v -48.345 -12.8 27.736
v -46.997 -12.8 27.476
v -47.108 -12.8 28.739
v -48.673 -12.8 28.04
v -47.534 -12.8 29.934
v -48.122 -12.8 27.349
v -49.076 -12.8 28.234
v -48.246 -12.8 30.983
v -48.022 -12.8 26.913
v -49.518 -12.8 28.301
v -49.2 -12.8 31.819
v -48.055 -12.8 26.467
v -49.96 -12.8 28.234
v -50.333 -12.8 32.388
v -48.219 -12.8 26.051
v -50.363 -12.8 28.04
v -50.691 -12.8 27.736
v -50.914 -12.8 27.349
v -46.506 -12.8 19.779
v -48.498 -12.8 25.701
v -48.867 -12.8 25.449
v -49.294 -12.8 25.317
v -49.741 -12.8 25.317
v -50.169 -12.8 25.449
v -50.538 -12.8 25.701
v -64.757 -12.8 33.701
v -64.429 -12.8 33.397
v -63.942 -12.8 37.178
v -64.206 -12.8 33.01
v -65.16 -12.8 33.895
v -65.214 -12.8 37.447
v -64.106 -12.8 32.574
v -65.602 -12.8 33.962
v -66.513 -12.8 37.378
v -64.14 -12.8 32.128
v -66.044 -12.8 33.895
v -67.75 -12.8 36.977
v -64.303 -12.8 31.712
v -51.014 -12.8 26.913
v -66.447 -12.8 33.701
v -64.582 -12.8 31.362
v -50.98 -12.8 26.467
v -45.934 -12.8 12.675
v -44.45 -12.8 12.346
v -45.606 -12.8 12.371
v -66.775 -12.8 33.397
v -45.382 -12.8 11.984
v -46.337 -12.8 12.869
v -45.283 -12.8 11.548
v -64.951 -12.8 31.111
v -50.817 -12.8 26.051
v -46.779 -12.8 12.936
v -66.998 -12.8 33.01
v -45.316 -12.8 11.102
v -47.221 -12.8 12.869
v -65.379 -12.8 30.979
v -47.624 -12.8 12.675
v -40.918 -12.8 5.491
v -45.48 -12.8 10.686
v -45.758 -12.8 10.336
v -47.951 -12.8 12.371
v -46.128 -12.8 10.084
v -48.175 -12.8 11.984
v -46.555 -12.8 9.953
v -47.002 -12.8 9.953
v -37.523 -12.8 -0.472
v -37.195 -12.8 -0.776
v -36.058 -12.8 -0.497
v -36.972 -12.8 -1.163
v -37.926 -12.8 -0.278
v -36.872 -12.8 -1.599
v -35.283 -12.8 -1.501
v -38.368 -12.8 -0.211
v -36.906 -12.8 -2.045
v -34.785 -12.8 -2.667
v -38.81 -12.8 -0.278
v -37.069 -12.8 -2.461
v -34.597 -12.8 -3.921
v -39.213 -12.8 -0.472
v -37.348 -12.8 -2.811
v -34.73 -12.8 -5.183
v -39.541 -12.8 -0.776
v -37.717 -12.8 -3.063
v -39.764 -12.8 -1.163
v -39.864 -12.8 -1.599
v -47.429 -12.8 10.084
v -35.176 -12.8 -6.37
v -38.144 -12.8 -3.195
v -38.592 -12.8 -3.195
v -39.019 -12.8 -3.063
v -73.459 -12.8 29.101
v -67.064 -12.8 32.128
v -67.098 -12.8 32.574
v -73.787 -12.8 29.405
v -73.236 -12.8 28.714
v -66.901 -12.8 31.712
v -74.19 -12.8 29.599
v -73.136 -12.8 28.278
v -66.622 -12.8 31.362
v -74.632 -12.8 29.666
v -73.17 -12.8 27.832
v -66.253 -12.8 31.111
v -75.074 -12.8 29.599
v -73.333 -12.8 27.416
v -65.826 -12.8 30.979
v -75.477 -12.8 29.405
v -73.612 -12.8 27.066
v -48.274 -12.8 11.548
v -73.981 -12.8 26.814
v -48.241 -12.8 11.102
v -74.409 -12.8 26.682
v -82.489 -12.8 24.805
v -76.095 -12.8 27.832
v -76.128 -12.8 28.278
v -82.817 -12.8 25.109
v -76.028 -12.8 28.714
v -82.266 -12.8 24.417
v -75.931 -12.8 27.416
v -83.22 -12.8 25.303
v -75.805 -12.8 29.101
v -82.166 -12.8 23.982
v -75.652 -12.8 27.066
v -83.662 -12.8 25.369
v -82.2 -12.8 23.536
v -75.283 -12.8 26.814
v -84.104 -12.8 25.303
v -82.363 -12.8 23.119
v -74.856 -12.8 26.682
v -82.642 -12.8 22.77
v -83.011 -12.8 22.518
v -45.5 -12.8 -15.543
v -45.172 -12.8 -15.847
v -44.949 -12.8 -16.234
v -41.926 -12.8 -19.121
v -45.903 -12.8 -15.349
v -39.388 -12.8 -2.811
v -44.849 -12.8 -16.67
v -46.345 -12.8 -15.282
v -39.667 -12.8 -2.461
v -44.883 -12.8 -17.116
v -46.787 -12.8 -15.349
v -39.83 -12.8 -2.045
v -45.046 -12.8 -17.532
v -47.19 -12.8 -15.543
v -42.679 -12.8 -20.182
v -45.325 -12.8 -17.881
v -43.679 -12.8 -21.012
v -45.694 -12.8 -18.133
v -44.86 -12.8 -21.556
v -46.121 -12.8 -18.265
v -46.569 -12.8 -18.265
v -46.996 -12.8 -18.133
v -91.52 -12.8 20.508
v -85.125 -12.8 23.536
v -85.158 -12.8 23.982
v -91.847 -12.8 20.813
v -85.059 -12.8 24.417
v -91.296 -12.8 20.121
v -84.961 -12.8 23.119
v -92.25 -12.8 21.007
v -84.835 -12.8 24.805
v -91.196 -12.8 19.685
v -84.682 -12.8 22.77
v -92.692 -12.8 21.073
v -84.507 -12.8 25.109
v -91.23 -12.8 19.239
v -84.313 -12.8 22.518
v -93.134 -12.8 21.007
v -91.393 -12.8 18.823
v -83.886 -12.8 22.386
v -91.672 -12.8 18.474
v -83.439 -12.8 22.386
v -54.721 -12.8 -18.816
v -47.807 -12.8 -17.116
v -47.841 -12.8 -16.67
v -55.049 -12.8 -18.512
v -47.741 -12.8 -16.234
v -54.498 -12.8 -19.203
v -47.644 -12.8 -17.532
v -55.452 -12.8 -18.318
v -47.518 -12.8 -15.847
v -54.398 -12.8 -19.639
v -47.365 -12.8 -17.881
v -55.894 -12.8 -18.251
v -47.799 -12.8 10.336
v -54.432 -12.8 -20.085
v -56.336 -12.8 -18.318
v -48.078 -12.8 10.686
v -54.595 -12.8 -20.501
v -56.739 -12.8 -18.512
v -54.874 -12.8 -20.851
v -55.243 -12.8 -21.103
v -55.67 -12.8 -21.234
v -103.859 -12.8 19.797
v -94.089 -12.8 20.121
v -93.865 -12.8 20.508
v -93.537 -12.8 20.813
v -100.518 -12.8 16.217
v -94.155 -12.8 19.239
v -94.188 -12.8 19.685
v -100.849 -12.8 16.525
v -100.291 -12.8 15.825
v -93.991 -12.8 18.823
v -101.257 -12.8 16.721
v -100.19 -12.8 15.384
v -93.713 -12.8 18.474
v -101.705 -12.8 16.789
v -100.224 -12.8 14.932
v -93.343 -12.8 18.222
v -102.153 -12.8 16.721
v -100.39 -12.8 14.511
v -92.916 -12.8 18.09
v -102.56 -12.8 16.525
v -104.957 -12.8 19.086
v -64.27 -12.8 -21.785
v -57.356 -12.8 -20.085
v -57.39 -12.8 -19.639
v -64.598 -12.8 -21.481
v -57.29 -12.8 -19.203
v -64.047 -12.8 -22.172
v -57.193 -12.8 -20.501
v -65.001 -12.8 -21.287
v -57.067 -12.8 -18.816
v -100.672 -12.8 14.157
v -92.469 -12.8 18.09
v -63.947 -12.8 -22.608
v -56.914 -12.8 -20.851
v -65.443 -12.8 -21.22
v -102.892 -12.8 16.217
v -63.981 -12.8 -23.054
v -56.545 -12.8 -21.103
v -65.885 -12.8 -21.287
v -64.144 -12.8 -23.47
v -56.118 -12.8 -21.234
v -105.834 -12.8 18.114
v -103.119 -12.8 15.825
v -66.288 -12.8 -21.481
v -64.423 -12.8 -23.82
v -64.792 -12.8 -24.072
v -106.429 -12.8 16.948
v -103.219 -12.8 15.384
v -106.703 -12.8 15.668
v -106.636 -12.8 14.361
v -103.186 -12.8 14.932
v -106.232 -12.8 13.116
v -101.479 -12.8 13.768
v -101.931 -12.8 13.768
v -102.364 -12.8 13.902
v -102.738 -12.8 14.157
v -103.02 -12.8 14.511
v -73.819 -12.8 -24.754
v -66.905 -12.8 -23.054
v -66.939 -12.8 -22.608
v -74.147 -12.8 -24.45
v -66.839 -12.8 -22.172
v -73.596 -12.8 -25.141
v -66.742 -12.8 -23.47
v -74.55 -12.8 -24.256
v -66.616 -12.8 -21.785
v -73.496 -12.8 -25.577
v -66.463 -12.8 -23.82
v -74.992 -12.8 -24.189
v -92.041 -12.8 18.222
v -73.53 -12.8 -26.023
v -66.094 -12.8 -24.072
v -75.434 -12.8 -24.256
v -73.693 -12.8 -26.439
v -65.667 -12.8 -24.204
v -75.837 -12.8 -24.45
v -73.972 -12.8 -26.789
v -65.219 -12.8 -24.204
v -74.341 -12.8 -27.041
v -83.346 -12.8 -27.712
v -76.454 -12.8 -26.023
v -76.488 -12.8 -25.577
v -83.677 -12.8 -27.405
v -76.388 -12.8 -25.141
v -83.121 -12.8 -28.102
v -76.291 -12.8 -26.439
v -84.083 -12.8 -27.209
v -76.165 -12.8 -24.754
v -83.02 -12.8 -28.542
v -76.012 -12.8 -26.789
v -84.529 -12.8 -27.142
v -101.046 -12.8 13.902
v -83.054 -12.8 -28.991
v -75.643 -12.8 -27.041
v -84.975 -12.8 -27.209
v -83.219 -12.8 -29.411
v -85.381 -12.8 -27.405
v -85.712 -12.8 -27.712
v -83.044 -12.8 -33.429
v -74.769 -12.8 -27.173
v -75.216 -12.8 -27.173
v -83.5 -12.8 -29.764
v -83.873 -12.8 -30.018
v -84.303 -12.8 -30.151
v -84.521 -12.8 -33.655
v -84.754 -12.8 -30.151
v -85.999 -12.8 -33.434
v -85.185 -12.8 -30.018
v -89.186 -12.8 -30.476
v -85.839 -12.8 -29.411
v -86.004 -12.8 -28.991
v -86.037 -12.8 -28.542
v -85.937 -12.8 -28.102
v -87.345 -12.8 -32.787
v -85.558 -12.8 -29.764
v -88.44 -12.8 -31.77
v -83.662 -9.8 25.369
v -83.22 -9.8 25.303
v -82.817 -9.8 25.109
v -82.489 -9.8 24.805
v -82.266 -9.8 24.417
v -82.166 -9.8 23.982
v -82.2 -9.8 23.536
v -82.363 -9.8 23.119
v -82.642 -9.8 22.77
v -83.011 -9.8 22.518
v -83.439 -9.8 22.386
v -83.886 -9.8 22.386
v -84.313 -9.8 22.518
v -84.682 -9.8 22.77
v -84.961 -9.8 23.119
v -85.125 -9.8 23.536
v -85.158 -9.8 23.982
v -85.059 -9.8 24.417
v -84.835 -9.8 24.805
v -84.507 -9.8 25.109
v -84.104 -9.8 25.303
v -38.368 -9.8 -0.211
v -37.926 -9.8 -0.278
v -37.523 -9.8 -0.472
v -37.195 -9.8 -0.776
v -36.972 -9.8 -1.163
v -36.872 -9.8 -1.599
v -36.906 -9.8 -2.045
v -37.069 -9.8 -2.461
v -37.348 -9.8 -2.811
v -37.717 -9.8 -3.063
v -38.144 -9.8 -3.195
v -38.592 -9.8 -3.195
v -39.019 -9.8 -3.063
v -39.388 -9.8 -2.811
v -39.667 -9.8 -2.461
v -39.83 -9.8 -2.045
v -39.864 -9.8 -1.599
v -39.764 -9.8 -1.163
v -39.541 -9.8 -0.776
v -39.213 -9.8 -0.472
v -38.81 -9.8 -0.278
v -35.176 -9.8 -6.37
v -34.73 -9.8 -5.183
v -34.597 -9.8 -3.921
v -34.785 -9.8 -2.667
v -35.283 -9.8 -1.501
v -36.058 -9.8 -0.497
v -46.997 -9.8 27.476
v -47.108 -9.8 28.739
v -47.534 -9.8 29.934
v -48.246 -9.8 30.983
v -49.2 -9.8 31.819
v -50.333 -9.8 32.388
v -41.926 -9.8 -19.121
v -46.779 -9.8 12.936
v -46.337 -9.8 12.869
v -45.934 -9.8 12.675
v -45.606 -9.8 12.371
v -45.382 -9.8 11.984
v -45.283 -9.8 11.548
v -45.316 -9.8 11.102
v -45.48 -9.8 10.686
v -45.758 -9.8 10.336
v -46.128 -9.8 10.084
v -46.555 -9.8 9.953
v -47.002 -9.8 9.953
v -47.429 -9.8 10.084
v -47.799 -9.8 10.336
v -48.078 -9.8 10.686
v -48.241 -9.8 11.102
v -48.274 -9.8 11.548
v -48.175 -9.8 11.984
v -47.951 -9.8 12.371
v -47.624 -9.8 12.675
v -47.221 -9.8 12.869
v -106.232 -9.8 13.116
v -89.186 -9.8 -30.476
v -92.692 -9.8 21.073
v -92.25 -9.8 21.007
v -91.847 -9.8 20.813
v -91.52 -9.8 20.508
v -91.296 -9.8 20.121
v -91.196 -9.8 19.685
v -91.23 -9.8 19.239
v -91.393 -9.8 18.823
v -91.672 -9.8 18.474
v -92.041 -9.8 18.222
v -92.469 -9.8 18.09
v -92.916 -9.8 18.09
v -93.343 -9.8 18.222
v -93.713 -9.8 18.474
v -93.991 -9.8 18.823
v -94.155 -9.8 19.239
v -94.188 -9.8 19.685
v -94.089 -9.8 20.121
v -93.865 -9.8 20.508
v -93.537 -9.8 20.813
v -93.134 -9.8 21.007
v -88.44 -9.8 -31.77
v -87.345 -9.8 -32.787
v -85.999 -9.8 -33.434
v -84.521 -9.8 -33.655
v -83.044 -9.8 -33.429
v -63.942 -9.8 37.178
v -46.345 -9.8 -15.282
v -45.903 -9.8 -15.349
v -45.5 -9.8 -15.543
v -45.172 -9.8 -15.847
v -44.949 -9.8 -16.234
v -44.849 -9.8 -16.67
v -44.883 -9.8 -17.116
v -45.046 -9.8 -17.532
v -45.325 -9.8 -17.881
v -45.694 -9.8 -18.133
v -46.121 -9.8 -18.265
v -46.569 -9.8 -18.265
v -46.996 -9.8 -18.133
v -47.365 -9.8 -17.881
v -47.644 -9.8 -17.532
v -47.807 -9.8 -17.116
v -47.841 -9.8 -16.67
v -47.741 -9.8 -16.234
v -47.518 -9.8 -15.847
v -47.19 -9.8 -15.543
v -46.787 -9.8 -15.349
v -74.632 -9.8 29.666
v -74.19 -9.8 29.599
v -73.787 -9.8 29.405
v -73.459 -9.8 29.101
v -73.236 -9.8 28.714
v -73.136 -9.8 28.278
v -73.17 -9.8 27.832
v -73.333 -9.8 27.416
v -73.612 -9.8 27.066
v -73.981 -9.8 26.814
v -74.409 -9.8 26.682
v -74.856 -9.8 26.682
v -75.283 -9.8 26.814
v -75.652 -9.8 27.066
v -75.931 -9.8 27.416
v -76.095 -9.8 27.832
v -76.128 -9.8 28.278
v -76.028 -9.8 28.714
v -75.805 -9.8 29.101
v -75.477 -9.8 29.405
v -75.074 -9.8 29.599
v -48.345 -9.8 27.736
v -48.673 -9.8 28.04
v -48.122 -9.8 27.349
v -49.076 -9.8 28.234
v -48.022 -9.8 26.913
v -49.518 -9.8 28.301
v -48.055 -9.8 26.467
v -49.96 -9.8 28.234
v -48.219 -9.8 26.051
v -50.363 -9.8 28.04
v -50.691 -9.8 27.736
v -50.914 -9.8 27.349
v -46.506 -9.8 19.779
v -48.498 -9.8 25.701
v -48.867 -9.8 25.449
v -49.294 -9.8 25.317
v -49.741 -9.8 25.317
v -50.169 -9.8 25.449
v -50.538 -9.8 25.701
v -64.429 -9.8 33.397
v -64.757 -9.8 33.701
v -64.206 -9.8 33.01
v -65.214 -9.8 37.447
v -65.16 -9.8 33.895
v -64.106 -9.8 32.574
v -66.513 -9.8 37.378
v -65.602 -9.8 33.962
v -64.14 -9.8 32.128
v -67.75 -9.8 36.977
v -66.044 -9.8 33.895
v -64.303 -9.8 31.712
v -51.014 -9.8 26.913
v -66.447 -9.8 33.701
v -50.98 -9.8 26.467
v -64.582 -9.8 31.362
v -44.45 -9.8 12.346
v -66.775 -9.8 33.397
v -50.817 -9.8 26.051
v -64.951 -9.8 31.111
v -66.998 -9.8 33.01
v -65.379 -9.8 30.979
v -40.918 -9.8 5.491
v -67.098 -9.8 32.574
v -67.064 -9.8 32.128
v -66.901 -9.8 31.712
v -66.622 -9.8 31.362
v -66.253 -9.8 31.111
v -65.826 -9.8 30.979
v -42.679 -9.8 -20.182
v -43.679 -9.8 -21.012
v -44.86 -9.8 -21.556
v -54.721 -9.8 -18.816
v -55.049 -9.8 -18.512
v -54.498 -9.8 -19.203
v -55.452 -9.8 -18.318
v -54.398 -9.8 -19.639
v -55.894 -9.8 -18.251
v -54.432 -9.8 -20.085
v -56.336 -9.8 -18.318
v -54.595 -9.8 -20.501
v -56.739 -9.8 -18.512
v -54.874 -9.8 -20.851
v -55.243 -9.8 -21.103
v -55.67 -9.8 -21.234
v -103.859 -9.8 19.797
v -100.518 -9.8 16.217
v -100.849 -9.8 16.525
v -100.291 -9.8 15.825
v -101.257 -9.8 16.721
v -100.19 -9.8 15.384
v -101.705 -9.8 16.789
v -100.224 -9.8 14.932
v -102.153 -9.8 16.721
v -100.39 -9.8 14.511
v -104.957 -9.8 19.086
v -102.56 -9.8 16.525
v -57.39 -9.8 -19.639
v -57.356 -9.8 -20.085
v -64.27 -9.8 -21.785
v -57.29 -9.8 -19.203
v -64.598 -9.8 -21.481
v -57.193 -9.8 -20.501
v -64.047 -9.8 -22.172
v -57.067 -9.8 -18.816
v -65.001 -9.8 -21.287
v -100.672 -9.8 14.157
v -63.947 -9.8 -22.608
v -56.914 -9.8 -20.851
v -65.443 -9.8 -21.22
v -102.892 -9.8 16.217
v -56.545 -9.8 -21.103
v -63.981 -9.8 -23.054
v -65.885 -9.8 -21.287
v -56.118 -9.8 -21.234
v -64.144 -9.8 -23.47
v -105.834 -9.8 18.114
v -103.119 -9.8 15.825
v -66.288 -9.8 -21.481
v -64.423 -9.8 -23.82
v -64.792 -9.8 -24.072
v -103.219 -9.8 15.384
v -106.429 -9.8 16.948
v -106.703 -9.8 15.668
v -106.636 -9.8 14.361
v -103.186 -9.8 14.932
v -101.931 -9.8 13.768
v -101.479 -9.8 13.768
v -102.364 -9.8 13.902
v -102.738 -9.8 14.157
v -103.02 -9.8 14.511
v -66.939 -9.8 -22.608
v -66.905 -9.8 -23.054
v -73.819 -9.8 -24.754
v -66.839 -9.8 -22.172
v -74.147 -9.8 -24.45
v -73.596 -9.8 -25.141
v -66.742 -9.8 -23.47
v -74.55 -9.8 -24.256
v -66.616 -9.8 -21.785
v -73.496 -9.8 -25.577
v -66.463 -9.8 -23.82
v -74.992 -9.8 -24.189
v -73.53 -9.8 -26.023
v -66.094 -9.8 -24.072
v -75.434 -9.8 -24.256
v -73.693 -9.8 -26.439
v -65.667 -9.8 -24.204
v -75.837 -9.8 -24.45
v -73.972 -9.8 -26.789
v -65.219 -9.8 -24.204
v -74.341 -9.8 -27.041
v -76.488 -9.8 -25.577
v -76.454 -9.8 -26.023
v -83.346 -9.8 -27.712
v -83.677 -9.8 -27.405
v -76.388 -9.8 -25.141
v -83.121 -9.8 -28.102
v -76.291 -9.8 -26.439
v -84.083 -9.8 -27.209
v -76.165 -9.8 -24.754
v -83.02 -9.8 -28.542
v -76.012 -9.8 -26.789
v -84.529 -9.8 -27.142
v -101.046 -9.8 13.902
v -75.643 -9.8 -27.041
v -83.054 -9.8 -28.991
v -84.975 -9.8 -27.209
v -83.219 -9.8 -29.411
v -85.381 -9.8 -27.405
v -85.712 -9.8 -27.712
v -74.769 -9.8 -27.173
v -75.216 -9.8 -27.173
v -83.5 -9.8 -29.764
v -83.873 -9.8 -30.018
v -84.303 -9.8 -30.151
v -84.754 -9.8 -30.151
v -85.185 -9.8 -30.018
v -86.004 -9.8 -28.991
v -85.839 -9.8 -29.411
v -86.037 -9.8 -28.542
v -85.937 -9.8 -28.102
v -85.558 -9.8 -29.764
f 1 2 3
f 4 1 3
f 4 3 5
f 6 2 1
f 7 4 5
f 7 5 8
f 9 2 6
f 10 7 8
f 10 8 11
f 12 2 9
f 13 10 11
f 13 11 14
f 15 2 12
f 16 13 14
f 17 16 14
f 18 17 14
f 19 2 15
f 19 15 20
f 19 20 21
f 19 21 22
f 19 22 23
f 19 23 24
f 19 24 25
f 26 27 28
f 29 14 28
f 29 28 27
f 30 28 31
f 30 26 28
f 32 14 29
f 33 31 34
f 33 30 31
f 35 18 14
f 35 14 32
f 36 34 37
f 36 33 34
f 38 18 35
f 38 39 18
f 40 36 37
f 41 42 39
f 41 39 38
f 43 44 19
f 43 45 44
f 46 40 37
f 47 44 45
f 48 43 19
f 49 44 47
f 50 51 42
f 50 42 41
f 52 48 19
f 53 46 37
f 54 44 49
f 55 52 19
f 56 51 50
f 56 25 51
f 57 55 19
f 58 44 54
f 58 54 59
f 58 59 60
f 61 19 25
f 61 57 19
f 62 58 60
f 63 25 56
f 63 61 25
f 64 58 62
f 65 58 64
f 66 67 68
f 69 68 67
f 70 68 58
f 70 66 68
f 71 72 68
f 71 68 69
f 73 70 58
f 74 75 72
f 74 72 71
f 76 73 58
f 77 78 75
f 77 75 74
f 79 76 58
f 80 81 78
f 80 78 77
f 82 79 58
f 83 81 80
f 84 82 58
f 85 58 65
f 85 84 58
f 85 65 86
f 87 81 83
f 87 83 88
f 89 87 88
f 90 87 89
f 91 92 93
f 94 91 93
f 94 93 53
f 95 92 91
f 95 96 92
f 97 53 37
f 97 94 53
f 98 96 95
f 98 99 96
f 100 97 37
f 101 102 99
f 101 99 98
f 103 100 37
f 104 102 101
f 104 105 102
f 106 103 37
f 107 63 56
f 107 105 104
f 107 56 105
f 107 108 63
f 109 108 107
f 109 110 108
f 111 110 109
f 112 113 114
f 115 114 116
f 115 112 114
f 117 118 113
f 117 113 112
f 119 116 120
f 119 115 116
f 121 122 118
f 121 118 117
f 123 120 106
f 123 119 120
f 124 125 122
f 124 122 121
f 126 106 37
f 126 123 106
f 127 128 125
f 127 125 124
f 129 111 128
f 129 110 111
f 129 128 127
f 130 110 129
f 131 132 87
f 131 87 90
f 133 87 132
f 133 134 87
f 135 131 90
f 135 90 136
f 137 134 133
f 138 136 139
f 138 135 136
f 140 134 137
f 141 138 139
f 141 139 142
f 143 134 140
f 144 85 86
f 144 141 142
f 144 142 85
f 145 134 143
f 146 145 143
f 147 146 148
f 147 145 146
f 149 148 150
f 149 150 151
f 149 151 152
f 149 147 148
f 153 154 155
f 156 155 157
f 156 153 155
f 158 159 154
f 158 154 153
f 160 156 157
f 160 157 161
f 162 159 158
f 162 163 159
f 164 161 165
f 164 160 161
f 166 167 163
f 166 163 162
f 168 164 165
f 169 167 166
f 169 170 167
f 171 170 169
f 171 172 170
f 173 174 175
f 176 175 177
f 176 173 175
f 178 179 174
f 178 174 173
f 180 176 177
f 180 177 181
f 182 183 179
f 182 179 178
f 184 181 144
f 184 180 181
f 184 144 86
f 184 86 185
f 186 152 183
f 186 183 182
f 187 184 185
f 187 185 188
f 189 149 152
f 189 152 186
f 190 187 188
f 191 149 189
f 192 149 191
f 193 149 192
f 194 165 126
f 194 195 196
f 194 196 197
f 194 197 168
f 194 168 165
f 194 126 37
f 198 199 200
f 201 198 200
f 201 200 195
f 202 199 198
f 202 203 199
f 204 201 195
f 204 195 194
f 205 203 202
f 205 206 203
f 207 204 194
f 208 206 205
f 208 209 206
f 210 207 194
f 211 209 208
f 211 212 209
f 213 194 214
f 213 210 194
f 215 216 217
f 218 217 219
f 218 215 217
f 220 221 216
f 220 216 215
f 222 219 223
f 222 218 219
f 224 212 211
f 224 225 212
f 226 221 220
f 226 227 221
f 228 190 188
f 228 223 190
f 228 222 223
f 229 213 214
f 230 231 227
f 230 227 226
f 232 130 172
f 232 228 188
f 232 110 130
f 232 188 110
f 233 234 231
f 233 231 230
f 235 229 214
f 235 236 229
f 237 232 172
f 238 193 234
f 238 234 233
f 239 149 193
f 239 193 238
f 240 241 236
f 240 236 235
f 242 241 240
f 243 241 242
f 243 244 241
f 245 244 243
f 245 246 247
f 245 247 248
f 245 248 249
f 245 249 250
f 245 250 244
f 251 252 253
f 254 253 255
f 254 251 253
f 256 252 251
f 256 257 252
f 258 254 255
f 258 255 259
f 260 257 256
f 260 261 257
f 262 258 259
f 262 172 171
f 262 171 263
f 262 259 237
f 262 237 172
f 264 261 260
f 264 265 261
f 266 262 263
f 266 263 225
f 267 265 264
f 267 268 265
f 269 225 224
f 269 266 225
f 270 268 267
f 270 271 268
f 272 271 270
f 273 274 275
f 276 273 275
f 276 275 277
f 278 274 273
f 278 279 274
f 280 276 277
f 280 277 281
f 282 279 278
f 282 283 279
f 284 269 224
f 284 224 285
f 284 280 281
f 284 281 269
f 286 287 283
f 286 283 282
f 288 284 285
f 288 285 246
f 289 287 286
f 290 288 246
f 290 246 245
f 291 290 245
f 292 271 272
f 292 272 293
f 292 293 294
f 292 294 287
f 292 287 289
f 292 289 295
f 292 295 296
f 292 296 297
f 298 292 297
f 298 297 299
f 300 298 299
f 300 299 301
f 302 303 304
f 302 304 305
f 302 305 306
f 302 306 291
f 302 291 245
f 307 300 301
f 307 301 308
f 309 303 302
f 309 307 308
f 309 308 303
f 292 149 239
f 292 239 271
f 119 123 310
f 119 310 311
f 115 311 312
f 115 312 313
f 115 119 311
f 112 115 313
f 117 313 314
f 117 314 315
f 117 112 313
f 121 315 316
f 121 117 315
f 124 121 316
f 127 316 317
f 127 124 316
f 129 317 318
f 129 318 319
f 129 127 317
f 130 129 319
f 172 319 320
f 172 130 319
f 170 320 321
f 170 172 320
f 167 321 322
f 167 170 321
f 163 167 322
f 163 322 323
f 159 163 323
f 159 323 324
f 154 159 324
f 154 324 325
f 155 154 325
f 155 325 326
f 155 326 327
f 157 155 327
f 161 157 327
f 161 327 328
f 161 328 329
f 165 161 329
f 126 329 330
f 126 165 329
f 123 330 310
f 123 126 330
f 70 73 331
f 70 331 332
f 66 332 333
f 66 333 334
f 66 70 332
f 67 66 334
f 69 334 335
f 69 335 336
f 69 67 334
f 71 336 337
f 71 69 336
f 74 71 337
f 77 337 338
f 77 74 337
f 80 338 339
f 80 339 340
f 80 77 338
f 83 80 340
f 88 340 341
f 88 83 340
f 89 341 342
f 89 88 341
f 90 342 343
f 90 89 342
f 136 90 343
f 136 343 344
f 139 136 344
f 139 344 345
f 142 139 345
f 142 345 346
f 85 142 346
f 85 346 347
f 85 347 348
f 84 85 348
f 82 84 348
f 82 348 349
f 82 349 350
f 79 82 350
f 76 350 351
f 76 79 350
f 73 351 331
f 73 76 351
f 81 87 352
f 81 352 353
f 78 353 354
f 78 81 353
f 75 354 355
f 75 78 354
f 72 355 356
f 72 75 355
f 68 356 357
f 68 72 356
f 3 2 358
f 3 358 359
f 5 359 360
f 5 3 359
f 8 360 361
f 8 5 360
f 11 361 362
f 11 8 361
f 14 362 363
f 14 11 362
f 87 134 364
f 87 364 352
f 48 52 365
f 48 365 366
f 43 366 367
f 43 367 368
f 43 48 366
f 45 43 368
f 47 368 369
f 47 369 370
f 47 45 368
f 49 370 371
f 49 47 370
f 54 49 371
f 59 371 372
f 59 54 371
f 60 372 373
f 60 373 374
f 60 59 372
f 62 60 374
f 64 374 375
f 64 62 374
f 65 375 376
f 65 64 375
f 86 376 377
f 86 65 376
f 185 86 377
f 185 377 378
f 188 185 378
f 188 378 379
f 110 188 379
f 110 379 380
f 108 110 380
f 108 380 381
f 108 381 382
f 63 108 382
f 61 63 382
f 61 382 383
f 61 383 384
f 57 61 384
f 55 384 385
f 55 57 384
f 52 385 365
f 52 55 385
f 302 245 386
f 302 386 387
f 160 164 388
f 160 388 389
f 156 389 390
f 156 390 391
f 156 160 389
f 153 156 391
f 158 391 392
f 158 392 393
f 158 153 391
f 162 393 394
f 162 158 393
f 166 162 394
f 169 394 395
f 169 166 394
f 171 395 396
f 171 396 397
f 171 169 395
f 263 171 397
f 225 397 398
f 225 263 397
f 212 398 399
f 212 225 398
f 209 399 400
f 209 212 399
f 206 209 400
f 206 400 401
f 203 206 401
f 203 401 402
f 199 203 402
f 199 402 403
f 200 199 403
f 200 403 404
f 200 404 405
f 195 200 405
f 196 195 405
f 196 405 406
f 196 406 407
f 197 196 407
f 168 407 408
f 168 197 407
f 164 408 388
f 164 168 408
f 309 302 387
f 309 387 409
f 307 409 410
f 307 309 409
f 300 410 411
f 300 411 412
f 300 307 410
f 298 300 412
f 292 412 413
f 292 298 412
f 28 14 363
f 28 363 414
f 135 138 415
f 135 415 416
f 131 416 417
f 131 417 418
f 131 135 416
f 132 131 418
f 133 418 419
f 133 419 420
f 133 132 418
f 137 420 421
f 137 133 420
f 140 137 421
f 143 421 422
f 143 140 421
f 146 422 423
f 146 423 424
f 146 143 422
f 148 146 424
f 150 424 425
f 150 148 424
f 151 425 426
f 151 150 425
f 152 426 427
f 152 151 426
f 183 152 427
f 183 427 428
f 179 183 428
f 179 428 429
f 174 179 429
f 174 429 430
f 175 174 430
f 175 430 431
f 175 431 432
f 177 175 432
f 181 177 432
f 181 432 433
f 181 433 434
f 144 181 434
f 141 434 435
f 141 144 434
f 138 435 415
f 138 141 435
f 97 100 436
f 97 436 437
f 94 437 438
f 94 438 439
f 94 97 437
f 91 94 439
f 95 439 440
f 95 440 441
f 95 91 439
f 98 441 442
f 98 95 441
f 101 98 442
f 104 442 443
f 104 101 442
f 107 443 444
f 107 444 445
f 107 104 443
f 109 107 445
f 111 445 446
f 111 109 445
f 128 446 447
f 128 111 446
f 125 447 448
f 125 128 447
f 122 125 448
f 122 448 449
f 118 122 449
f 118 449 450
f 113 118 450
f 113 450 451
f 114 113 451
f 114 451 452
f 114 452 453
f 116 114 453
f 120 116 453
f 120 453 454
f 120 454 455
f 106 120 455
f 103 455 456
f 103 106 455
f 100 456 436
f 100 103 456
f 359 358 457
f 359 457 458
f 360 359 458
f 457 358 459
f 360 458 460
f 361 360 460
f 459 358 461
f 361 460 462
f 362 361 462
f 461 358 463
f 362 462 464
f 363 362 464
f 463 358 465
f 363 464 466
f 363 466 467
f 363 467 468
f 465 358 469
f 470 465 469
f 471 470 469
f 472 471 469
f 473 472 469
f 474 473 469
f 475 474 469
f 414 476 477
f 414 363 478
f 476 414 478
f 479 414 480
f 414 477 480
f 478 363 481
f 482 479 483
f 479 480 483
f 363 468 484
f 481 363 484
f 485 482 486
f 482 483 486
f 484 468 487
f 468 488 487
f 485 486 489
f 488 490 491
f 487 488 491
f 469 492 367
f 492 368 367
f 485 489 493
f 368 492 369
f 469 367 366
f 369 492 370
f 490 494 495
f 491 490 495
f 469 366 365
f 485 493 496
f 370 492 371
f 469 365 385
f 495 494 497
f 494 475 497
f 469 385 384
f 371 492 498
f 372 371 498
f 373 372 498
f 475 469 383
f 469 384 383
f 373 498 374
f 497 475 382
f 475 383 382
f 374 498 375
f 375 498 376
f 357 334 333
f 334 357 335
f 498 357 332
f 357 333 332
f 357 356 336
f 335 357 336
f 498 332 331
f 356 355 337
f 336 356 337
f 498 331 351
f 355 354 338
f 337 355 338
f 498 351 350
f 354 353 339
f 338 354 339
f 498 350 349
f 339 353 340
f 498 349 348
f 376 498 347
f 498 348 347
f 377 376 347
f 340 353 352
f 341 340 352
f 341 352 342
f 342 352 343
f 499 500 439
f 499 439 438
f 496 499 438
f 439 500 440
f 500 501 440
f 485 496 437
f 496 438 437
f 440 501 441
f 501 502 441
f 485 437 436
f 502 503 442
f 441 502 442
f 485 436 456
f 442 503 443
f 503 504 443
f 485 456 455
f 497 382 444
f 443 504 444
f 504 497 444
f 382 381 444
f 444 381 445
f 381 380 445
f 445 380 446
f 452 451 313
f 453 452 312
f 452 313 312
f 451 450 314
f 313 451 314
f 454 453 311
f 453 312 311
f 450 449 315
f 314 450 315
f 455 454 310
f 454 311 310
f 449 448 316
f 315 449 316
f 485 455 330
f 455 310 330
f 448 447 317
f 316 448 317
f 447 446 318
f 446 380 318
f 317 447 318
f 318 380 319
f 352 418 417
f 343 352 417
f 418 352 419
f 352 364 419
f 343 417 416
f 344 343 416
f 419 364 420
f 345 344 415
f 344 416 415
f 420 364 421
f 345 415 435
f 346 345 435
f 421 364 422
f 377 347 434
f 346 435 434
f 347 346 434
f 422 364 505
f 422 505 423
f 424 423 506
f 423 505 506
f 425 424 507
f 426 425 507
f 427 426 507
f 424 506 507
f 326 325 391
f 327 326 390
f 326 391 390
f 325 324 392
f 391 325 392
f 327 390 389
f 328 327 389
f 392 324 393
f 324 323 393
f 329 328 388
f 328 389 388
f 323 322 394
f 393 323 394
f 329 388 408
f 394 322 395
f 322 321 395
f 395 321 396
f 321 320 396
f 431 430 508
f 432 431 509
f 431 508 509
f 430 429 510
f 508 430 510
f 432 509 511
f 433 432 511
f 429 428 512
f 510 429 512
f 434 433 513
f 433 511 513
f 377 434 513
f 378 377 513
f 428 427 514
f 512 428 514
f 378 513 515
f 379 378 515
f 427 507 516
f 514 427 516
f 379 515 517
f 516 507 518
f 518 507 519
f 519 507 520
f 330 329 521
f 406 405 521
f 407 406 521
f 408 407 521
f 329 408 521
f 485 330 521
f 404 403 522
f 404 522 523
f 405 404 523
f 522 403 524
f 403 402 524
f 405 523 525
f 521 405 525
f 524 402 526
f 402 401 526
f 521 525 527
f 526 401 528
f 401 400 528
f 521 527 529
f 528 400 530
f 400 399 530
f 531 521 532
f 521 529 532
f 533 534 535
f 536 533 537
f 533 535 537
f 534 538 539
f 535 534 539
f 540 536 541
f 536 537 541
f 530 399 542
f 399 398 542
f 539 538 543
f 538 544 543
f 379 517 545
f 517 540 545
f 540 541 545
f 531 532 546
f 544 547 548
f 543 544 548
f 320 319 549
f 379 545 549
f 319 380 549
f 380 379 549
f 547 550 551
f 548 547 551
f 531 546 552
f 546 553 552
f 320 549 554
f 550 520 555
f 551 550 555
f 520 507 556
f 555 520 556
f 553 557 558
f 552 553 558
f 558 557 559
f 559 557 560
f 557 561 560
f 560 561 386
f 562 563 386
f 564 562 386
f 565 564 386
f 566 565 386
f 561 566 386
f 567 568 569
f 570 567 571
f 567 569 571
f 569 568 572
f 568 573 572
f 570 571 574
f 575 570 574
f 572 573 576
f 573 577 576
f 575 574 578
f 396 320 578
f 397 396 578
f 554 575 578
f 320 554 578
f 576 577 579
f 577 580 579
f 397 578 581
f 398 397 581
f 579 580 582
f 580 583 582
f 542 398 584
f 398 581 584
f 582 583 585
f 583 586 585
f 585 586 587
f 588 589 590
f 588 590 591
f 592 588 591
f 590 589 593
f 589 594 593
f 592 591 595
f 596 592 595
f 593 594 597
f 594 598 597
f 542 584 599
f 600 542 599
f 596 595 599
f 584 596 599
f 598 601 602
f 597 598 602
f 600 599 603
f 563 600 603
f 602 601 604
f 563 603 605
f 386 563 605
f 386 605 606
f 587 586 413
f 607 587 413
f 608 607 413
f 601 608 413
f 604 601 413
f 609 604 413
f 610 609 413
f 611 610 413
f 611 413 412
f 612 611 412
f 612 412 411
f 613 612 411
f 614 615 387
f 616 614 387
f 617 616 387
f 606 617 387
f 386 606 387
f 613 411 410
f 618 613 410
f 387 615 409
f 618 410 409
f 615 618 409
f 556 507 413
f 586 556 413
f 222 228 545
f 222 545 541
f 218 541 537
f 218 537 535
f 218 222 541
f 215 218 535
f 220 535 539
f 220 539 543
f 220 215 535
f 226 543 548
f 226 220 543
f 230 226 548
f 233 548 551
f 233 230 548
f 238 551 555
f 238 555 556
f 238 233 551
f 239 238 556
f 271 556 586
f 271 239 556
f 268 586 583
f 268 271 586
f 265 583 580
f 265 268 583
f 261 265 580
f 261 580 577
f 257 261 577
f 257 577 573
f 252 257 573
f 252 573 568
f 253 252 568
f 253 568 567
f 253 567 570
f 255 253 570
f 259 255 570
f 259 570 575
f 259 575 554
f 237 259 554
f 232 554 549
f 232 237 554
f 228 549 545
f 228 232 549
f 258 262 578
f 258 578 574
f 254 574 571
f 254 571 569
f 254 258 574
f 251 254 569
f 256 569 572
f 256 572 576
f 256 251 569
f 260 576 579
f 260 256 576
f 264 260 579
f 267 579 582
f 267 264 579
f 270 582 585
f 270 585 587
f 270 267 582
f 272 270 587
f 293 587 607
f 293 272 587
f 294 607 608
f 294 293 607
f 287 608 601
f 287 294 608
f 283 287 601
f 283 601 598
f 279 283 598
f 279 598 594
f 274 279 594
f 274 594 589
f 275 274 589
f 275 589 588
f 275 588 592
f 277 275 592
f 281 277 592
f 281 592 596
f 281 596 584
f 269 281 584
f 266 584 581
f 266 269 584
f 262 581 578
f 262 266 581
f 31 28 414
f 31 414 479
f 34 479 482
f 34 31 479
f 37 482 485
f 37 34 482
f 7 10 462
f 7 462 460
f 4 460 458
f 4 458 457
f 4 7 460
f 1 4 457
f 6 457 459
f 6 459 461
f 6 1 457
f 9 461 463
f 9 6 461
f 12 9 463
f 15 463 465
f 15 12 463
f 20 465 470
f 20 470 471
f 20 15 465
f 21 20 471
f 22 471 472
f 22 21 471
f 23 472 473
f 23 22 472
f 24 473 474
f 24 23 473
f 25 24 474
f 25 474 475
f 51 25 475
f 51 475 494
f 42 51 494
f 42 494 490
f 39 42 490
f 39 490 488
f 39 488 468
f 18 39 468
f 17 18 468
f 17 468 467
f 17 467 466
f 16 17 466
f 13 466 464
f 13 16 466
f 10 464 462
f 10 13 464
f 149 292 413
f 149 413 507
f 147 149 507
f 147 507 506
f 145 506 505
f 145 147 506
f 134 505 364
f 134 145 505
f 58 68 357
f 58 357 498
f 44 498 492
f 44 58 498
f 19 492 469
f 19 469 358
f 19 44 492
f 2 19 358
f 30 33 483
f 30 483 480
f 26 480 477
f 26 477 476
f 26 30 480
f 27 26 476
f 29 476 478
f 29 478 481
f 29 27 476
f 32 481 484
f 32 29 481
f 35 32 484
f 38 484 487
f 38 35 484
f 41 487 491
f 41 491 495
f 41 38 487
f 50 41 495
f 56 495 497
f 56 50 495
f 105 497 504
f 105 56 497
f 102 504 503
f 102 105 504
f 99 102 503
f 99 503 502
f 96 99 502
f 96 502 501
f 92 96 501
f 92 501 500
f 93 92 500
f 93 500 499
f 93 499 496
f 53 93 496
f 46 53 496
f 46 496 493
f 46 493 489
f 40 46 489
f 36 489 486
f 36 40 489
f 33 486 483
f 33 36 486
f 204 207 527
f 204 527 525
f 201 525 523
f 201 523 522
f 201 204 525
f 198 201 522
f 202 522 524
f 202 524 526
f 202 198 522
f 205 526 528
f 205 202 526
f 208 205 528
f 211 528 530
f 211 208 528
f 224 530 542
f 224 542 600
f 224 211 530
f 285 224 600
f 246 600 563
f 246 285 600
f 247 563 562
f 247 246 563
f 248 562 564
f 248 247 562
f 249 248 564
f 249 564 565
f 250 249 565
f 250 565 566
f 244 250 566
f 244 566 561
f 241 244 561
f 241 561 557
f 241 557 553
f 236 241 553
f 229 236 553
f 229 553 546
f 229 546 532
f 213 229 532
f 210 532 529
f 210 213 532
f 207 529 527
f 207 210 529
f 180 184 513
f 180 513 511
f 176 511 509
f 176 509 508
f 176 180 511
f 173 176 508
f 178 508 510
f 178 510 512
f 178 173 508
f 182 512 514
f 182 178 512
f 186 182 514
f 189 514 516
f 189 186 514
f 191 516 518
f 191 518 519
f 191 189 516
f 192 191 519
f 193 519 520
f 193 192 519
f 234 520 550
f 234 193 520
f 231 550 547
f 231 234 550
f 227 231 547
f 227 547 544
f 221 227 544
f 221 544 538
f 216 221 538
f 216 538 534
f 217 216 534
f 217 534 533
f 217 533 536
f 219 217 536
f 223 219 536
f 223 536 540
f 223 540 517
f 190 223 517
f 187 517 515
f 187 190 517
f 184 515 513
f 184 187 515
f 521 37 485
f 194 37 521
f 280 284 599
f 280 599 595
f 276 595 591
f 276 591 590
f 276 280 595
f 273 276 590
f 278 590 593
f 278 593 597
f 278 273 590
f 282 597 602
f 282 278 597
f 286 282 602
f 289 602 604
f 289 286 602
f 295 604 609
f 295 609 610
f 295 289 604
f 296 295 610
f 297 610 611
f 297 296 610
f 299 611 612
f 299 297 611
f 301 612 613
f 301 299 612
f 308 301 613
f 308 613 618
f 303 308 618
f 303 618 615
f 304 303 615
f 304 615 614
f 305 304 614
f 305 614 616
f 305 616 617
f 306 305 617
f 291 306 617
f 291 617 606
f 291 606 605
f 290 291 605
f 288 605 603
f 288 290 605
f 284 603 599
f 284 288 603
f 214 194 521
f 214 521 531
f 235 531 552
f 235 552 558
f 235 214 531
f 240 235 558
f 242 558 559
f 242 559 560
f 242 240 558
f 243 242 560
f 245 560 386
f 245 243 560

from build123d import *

# Parameters (mm, degrees)
SKETCH_2_R      = 1.5
SKETCH_2_R_2    = 1.518721219
SKETCH_2_R_3    = 1.512738874
EXTRUDE_1_DEPTH = 3


with BuildPart() as part:
    # 草图2 → 凸台-拉伸1 (new body)
    with BuildSketch(Plane(origin=(0, -12.8, 0), x_dir=(1, 0, 0), z_dir=(0, 1, 0))):
        with BuildLine():
            Line((-67.750211529, -36.977031927), (-103.858972682, -19.797438789))
            ThreePointArc((-103.858972682, -19.797438789), (-106.429442956, -16.948260564), (-106.232366674, -13.115990359))
            Line((-106.232366674, -13.115990359), (-89.185537995, 30.475859314))
            ThreePointArc((-89.185537995, 30.475859314), (-86.69601178, 33.160837283), (-83.04433662, 33.429381478))
            Line((-83.04433662, 33.429381478), (-44.860392292, 21.55641016))
            ThreePointArc((-44.860392292, 21.55641016), (-43.151818029, 20.629450998), (-41.925856607, 19.120975645))
            Line((-41.925856607, 19.120975645), (-35.176480428, 6.369645252))
            ThreePointArc((-35.176480428, 6.369645252), (-34.651006031, 3.288347657), (-36.057985487, 0.497124446))
            ThreePointArc((-36.057985487, 0.497124446), (-44.450352857, -12.346252855), (-46.996898287, -27.475670456))
            ThreePointArc((-46.996898287, -27.475670456), (-47.856649261, -30.480890326), (-50.332989366, -32.388312117))
            Line((-50.332989366, -32.388312117), (-63.942022797, -37.178376279))
            ThreePointArc((-63.942022797, -37.178376279), (-65.866066657, -37.455025022), (-67.750211529, -36.977031927))
        make_face()
        with Locations(Location((-65.602078267, -32.461998872, 0), (0, 0, 270))):
            Circle(SKETCH_2_R, mode=Mode.SUBTRACT)
        with Locations(Location((-74.632144377, -28.165732348, 0), (0, 0, 270))):
            Circle(SKETCH_2_R, mode=Mode.SUBTRACT)
        with Locations(Location((-83.662210487, -23.869465823, 0), (0, 0, 270))):
            Circle(SKETCH_2_R, mode=Mode.SUBTRACT)
        with Locations(Location((-92.692276597, -19.573199299, 0), (0, 0, 270))):
            Circle(SKETCH_2_R, mode=Mode.SUBTRACT)
        with Locations(Location((-101.704945463, -15.270017578, 0), (0, 0, 270))):
            Circle(SKETCH_2_R_2, mode=Mode.SUBTRACT)
        with Locations(Location((-84.528930836, 28.654867889, 0), (0, 0, 270))):
            Circle(SKETCH_2_R_3, mode=Mode.SUBTRACT)
        with Locations(Location((-74.992068043, 25.689461869, 0), (0, 0, 270))):
            Circle(SKETCH_2_R, mode=Mode.SUBTRACT)
        with Locations(Location((-65.443040865, 22.720273436, 0), (0, 0, 270))):
            Circle(SKETCH_2_R, mode=Mode.SUBTRACT)
        with Locations(Location((-55.894013686, 19.751085004, 0), (0, 0, 270))):
            Circle(SKETCH_2_R, mode=Mode.SUBTRACT)
        with Locations(Location((-46.344986508, 16.781896571, 0), (0, 0, 270))):
            Circle(SKETCH_2_R, mode=Mode.SUBTRACT)
        with Locations(Location((-38.368045535, 1.711376394, 0), (0, 0, 270))):
            Circle(SKETCH_2_R, mode=Mode.SUBTRACT)
        with Locations(Location((-46.778656436, -11.435757143, 0), (0, 0, 270))):
            Circle(SKETCH_2_R, mode=Mode.SUBTRACT)
        with Locations(Location((-49.517857516, -26.800726176, 0), (0, 0, 270))):
            Circle(SKETCH_2_R, mode=Mode.SUBTRACT)
    extrude(amount=EXTRUDE_1_DEPTH)


solid = part.part
